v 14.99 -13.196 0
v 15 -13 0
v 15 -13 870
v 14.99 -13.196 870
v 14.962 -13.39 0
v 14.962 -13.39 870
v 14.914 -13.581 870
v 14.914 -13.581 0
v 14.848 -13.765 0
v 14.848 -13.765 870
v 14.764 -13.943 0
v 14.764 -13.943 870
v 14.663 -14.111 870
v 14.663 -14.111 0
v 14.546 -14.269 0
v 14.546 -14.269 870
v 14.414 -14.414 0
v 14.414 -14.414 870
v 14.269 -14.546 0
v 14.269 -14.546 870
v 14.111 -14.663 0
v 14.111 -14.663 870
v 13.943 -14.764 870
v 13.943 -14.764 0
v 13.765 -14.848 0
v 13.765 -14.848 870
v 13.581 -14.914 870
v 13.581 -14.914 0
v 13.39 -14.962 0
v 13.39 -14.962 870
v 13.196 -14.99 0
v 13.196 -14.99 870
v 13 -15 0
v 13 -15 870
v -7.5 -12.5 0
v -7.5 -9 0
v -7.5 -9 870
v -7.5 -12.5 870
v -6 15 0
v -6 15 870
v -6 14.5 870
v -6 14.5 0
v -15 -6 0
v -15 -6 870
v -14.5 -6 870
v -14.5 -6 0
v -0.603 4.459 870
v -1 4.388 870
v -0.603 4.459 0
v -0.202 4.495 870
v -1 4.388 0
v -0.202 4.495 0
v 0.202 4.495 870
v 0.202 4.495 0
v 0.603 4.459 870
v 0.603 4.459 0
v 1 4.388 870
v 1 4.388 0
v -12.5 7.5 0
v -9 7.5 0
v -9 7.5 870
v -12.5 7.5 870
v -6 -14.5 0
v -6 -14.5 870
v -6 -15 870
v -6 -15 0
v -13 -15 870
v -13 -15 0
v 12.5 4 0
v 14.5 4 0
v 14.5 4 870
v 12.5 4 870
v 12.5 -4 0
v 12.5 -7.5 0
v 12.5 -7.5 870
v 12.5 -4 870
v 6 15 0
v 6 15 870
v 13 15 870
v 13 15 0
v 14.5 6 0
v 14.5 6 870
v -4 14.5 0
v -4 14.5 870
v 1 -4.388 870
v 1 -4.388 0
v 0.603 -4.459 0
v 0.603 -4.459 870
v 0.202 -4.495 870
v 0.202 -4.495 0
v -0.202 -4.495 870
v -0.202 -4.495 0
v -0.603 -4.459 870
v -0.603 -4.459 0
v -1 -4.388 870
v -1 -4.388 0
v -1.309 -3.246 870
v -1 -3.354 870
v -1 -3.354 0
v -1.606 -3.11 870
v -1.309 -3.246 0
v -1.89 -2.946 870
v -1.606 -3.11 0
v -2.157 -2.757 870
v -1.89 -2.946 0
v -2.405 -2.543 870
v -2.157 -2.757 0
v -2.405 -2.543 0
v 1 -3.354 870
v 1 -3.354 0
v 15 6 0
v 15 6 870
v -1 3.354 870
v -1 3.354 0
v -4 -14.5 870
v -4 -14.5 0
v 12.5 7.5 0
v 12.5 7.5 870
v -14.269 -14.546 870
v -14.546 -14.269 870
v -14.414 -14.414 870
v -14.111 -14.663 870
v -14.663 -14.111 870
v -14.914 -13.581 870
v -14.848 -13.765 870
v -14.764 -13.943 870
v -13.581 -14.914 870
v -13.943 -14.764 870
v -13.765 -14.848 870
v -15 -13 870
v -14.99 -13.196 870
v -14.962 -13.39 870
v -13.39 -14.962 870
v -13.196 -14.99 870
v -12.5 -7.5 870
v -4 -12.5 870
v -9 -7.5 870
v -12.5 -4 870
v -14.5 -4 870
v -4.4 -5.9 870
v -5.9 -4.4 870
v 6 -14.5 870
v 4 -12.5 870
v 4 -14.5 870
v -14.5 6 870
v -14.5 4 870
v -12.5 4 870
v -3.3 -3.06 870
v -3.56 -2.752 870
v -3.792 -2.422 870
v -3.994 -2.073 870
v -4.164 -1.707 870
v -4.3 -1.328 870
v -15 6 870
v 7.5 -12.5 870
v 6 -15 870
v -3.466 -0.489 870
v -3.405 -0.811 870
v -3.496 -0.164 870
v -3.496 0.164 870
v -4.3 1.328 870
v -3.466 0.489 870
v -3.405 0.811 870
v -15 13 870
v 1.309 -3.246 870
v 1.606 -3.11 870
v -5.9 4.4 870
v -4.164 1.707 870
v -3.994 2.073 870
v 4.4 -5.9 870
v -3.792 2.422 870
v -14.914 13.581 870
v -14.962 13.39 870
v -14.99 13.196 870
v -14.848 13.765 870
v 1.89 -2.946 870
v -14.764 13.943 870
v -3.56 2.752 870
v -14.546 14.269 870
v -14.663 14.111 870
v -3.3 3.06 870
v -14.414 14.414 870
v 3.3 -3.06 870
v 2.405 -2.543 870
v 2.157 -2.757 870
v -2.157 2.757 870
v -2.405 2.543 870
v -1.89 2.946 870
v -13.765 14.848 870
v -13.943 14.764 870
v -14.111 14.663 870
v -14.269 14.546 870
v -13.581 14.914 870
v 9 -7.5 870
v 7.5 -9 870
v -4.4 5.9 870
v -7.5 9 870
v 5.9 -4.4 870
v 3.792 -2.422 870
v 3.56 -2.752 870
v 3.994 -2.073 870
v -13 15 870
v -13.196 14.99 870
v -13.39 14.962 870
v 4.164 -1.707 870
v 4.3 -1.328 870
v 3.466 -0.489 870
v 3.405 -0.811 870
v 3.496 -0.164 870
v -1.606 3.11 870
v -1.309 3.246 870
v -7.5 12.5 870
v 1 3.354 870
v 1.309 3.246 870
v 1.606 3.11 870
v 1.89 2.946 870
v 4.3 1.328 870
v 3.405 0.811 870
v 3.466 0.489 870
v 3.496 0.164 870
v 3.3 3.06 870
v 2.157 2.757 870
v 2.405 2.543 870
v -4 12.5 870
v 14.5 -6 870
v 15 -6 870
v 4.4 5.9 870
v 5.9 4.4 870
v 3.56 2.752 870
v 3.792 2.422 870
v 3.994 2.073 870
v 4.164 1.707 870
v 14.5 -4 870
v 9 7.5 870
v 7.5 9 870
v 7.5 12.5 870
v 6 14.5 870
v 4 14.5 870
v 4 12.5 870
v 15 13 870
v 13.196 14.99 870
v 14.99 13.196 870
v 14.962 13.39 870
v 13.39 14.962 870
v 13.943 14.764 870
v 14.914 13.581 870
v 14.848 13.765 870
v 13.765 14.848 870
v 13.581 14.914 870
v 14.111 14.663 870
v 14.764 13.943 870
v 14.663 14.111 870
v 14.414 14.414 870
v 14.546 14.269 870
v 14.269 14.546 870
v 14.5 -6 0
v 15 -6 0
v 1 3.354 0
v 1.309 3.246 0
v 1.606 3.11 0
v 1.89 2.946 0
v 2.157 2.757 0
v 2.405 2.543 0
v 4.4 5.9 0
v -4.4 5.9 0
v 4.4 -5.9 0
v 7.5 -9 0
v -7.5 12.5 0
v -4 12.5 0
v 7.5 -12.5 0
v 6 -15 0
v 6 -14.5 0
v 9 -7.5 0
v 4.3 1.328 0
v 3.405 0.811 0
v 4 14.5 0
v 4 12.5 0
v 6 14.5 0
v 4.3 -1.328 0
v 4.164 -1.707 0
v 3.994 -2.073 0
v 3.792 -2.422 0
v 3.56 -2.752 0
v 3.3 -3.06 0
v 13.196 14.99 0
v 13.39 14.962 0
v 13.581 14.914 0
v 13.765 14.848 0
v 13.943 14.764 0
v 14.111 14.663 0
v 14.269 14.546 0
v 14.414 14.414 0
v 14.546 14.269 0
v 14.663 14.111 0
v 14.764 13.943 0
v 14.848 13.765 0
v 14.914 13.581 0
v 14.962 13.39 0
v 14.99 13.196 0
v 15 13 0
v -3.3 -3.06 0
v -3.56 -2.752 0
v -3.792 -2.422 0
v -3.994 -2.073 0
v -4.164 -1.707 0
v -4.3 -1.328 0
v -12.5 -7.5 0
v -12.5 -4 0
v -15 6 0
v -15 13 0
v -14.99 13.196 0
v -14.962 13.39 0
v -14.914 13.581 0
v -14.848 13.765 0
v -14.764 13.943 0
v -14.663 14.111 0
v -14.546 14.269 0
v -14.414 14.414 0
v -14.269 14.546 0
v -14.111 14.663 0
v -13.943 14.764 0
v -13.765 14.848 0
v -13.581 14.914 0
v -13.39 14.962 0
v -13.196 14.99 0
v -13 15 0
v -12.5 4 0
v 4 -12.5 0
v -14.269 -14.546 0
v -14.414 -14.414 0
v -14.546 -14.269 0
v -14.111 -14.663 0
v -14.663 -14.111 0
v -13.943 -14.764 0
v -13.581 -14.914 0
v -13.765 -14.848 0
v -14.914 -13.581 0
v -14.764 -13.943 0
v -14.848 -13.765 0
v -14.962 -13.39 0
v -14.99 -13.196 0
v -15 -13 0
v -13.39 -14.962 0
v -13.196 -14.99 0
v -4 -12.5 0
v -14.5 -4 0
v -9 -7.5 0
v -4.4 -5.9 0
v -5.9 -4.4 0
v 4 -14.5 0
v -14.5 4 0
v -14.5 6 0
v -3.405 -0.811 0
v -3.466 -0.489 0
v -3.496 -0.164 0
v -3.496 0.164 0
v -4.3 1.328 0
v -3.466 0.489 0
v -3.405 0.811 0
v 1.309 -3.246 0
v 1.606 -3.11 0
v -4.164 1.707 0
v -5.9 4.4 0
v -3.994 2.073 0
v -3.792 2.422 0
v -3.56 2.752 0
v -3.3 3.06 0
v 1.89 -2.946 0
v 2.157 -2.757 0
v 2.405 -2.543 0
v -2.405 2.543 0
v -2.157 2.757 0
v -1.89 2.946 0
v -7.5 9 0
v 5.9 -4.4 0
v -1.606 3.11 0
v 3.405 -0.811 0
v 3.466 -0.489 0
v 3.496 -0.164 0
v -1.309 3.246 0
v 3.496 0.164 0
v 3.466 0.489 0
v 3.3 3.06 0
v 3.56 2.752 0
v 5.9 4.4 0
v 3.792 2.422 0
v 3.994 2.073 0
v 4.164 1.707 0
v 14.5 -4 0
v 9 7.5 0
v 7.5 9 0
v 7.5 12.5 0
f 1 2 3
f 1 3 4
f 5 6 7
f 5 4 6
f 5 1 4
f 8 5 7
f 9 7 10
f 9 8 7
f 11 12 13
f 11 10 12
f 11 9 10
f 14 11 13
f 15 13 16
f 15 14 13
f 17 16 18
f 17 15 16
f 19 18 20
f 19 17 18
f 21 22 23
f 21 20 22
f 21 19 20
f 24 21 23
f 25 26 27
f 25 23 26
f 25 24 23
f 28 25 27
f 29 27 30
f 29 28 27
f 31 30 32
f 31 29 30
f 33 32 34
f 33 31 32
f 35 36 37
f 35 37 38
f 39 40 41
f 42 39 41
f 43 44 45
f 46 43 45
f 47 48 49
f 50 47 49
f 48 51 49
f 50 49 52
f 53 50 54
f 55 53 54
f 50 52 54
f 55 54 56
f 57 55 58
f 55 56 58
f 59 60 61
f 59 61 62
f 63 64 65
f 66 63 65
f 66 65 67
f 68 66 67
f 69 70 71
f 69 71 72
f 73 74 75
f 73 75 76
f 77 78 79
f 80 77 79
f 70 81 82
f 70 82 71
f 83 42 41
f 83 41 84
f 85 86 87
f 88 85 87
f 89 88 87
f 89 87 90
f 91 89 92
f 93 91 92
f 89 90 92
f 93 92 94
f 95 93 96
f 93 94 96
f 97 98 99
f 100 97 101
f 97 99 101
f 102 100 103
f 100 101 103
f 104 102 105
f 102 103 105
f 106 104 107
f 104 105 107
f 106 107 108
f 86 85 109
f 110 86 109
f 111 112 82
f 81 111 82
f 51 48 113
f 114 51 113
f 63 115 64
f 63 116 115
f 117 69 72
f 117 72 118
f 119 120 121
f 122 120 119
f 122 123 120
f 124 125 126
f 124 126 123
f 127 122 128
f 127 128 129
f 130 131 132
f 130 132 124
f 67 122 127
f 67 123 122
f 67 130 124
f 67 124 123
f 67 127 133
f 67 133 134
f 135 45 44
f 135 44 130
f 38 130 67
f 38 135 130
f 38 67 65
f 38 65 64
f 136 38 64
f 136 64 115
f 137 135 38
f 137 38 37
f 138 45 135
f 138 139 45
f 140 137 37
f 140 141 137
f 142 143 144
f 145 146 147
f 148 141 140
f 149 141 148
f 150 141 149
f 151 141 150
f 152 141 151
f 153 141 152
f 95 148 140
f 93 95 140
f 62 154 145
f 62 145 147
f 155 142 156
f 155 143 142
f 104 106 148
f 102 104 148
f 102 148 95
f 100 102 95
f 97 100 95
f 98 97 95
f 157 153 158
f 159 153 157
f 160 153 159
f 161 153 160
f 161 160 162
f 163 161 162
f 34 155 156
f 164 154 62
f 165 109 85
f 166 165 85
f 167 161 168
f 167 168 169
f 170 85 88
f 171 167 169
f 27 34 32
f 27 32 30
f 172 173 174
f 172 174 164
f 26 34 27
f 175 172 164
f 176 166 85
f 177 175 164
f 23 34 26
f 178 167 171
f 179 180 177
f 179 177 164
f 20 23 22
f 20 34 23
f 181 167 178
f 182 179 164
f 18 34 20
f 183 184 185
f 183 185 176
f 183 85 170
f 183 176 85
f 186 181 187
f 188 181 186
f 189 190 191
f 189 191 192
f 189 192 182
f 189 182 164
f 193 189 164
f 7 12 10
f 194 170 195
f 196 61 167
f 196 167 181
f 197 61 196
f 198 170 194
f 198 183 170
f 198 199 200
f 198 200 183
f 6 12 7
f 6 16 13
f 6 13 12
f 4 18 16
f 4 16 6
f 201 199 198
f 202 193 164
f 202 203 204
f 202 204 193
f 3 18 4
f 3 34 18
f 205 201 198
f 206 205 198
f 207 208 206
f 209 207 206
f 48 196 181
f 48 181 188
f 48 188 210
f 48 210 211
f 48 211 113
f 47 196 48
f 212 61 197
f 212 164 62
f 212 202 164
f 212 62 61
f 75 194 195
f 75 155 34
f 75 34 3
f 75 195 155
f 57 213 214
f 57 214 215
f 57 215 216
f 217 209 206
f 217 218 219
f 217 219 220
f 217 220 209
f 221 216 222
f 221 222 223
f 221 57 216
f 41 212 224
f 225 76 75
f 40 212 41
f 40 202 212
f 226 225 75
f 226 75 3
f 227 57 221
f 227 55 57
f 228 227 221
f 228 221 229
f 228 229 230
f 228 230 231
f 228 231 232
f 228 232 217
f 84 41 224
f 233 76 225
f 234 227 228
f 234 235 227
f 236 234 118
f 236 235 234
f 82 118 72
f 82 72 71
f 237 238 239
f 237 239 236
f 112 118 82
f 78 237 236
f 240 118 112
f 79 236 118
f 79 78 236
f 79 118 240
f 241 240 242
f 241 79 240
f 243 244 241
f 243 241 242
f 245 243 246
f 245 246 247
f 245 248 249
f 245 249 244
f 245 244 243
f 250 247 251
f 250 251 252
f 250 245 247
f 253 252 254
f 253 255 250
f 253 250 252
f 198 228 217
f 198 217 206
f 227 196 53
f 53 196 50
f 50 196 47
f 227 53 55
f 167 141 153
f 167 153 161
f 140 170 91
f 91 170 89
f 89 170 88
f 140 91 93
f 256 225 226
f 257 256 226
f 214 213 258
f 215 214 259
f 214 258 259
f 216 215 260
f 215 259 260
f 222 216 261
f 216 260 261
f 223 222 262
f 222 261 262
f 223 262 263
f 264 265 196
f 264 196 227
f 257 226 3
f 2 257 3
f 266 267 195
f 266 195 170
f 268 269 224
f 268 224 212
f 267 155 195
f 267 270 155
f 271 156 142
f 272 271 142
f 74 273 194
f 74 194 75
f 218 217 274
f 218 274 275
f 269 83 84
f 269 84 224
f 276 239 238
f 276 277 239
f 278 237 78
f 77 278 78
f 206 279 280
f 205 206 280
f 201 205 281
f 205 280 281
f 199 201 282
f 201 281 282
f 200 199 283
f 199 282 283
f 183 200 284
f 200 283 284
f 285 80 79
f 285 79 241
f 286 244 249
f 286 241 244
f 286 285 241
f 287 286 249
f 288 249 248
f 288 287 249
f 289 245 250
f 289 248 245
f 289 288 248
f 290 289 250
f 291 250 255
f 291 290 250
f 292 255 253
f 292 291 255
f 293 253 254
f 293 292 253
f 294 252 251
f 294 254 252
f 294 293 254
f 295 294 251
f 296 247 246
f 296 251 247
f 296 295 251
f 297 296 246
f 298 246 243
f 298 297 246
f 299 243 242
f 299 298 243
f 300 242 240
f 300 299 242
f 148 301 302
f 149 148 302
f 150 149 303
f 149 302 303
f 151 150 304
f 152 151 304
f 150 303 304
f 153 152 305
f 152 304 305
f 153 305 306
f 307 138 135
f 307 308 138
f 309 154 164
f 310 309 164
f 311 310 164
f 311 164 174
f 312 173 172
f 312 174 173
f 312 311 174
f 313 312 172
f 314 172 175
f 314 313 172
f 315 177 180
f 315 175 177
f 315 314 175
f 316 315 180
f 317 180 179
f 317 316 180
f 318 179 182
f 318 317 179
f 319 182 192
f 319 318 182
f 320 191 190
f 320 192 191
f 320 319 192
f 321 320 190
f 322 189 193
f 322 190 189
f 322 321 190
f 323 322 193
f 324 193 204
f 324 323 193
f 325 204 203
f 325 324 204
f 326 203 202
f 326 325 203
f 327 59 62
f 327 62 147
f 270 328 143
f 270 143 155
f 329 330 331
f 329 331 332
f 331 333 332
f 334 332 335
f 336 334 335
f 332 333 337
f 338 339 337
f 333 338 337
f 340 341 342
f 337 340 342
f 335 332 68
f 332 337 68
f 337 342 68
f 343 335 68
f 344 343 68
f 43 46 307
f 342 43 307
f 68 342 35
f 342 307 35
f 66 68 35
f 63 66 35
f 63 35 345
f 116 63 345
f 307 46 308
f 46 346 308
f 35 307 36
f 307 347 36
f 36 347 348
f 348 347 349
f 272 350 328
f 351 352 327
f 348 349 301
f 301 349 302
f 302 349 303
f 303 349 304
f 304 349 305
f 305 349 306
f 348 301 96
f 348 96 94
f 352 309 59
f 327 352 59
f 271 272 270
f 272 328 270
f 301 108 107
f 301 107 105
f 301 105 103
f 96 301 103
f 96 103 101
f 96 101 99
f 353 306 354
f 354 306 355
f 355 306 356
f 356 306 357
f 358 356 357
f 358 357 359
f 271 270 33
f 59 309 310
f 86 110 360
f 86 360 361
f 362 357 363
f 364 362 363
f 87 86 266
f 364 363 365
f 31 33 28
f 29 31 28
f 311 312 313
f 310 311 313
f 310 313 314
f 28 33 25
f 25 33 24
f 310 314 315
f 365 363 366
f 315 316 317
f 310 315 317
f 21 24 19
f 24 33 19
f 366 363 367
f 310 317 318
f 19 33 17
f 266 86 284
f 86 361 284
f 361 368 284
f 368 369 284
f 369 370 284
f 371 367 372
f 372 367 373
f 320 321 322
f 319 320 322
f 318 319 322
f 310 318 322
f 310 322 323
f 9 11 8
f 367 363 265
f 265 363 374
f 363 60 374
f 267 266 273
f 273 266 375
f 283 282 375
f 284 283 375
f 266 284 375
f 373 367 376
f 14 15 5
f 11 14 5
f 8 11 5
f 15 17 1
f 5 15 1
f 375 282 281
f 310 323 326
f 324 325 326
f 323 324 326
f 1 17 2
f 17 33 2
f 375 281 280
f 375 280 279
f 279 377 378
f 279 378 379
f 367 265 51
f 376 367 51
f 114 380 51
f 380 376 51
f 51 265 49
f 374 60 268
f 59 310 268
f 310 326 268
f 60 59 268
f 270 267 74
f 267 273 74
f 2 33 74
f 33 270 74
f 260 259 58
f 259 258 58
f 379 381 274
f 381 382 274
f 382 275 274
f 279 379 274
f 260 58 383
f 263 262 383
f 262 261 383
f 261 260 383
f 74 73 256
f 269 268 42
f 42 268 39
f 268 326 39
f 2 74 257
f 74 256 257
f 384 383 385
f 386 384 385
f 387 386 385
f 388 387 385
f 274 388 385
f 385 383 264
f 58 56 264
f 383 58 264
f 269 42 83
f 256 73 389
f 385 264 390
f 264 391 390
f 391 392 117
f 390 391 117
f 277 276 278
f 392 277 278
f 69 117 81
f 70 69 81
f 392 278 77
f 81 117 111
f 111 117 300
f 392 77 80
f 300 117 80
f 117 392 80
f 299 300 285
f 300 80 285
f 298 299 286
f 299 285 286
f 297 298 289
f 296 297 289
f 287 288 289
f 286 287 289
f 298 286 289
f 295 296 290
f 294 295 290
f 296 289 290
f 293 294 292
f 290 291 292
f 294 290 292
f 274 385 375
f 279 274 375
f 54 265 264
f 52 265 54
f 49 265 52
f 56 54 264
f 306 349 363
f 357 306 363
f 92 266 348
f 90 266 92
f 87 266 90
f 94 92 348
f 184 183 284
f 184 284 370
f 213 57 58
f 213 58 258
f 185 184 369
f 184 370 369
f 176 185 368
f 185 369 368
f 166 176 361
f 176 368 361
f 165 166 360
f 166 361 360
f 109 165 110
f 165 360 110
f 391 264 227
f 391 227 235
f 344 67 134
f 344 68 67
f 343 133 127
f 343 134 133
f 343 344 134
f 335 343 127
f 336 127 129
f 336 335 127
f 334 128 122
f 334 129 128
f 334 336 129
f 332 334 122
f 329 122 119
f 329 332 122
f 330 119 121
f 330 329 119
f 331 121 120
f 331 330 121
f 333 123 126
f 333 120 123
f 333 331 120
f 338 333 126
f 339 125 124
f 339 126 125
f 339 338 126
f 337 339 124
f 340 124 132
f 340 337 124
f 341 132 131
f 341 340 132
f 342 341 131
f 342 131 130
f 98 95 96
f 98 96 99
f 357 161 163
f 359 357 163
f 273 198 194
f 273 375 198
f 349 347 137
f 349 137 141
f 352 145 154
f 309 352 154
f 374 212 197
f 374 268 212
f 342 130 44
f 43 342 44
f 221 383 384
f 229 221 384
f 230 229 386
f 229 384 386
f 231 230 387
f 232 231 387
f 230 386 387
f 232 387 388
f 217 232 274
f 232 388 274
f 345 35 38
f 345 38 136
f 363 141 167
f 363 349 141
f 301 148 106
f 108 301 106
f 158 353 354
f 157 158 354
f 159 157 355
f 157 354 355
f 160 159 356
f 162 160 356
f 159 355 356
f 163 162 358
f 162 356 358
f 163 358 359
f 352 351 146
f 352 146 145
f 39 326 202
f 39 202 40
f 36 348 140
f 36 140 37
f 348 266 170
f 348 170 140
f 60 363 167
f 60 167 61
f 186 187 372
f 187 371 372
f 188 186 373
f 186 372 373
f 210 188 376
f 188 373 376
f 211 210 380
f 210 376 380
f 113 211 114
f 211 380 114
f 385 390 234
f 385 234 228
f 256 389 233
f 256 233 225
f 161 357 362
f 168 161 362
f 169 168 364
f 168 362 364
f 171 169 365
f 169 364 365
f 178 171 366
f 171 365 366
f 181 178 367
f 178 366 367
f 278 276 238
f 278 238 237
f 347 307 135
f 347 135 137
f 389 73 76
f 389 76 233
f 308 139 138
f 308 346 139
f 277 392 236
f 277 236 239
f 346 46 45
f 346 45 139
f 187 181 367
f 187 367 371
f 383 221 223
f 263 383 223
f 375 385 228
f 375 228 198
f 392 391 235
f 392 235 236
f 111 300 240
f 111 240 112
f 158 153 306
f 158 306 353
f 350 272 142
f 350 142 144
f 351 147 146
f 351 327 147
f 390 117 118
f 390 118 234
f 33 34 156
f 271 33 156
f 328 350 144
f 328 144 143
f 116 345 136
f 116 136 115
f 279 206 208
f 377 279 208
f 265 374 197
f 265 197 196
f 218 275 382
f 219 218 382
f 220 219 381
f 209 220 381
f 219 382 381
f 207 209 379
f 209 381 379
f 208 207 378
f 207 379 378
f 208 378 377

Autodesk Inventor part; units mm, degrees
ref_plane "YZ Plane" through (0, 0, 0) normal (1, 0, 0) x (0, 1, 0)
ref_plane "XZ Plane" through (0, 0, 0) normal (0, 1, 0) x (-1, 0, 0)
ref_plane "XY Plane" through (0, 0, 0) normal (0, 0, 1) x (1, 0, 0)
sketch "Skizze1" plane through (0, 0, 0) normal (0, 0, 1) x (1, 0, 0)
  line L0 (-13, 15) -> (13, 15)
  line L1 (15, 13) -> (15, -13)
  line L2 (13, -15) -> (-13, -15)
  line L3 (-15, -13) -> (-15, 13)
  circle A0 centre (0, 0) radius 3.5
  line L4 (-21.5799, 0) -> (21.5799, 0) projected
  line L5 (0, -21.5799) -> (0, 21.5799) projected
  arc A1 (15, 13) -> (13, 15) centre (13, 13) ccw
  arc A2 (-13, 15) -> (-15, 13) centre (-13, 13) ccw
  arc A3 (-15, -13) -> (-13, -15) centre (-13, -13) ccw
  arc A4 (13, -15) -> (15, -13) centre (13, -13) ccw
  point P0 (-15, 15)
  point P1 (15, 15)
  point P2 (-15, -15)
  dimension "d0" = 30
  dimension "d1" = 30
  dimension "d2" = 7
  dimension "d3" = 2
extrude "Extrusion1" add sketch "Skizze1" along normal blind 870 contours L0 L5 A0 L4 L3 A2 | L0 A1 L1 L4 A0 L5 | L4 A0 L5 L2 A3 L3 | L4 L1 A4 L2 L5 A0
sketch "Skizze2" plane through (0, 0, 0) normal (0, 0, -1) x (-1, 0, 0)
  line L0 (13, -15) -> (-13, -15) projected
  line L1 (21, 0) -> (-21, 0) projected
  line L2 (0, -21) -> (0, 21) projected
  line L3 (-6, -15) -> (-6, -14.5)
  line L4 (-6, -14.5) -> (-4, -14.5)
  line L5 (-4, -14.5) -> (-4, -12.5)
  line L6 (-4, -12.5) -> (-7.5, -12.5)
  line L7 (-7.5, -12.5) -> (-7.5, -9)
  line L8 (-7.5, -9) -> (-4.4, -5.9)
  line L9 (-4.4, -5.9) -> (4.4, -5.9)
  line L10 (4.4, -5.9) -> (7.5, -9)
  line L11 (7.5, -9) -> (7.5, -12.5)
  line L12 (7.5, -12.5) -> (4, -12.5)
  line L13 (4, -12.5) -> (4, -14.5)
  line L14 (4, -14.5) -> (6, -14.5)
  line L15 (6, -14.5) -> (6, -15)
  dimension "d6" = 8
  dimension "d7" = 15
  dimension "d8" = 12
  dimension "d9" = 0.5
  dimension "d10" = 9.1
  dimension "d11" = 135
  dimension "d12" = 2.5
  dimension "d13" = 3.5
extrude "Extrusion2" cut sketch "Skizze2" against normal through all
pattern_circular "Runde Anordnung1" count 4 over 360 about axis through (0, 0, 0) along (0, 0, 1) of "Extrusion2"
sketch "Skizze3" plane through (0, 0, 0) normal (0, 0, -1) x (-1, 0, 0)
  circle A0 centre (0, 0) radius 3.5 projected
  line L0 (21, 0) -> (-21, 0) projected
  line L1 (0, -21) -> (0, 21) projected
  line L2 (-1, 4.3875) -> (-1, 3.3541)
  line L3 (1, 4.3875) -> (1, 3.3541)
  arc A1 (1, 4.3875) -> (-1, 4.3875) centre (0, 0) ccw
  dimension "d20" = 2
  dimension "d21" = 2
  dimension "d22" = 4.5
extrude "Extrusion3" cut sketch "Skizze3" against normal through all contours A0 L1 A1 L3 | A0 L2 A1 L1
pattern_circular "Runde Anordnung2" count 6 over 360 about axis through (0, 0, 0) along (0, 0, 1) of "Extrusion3"
properties part number "Alu-Profil Nut 8 30x30 870"
